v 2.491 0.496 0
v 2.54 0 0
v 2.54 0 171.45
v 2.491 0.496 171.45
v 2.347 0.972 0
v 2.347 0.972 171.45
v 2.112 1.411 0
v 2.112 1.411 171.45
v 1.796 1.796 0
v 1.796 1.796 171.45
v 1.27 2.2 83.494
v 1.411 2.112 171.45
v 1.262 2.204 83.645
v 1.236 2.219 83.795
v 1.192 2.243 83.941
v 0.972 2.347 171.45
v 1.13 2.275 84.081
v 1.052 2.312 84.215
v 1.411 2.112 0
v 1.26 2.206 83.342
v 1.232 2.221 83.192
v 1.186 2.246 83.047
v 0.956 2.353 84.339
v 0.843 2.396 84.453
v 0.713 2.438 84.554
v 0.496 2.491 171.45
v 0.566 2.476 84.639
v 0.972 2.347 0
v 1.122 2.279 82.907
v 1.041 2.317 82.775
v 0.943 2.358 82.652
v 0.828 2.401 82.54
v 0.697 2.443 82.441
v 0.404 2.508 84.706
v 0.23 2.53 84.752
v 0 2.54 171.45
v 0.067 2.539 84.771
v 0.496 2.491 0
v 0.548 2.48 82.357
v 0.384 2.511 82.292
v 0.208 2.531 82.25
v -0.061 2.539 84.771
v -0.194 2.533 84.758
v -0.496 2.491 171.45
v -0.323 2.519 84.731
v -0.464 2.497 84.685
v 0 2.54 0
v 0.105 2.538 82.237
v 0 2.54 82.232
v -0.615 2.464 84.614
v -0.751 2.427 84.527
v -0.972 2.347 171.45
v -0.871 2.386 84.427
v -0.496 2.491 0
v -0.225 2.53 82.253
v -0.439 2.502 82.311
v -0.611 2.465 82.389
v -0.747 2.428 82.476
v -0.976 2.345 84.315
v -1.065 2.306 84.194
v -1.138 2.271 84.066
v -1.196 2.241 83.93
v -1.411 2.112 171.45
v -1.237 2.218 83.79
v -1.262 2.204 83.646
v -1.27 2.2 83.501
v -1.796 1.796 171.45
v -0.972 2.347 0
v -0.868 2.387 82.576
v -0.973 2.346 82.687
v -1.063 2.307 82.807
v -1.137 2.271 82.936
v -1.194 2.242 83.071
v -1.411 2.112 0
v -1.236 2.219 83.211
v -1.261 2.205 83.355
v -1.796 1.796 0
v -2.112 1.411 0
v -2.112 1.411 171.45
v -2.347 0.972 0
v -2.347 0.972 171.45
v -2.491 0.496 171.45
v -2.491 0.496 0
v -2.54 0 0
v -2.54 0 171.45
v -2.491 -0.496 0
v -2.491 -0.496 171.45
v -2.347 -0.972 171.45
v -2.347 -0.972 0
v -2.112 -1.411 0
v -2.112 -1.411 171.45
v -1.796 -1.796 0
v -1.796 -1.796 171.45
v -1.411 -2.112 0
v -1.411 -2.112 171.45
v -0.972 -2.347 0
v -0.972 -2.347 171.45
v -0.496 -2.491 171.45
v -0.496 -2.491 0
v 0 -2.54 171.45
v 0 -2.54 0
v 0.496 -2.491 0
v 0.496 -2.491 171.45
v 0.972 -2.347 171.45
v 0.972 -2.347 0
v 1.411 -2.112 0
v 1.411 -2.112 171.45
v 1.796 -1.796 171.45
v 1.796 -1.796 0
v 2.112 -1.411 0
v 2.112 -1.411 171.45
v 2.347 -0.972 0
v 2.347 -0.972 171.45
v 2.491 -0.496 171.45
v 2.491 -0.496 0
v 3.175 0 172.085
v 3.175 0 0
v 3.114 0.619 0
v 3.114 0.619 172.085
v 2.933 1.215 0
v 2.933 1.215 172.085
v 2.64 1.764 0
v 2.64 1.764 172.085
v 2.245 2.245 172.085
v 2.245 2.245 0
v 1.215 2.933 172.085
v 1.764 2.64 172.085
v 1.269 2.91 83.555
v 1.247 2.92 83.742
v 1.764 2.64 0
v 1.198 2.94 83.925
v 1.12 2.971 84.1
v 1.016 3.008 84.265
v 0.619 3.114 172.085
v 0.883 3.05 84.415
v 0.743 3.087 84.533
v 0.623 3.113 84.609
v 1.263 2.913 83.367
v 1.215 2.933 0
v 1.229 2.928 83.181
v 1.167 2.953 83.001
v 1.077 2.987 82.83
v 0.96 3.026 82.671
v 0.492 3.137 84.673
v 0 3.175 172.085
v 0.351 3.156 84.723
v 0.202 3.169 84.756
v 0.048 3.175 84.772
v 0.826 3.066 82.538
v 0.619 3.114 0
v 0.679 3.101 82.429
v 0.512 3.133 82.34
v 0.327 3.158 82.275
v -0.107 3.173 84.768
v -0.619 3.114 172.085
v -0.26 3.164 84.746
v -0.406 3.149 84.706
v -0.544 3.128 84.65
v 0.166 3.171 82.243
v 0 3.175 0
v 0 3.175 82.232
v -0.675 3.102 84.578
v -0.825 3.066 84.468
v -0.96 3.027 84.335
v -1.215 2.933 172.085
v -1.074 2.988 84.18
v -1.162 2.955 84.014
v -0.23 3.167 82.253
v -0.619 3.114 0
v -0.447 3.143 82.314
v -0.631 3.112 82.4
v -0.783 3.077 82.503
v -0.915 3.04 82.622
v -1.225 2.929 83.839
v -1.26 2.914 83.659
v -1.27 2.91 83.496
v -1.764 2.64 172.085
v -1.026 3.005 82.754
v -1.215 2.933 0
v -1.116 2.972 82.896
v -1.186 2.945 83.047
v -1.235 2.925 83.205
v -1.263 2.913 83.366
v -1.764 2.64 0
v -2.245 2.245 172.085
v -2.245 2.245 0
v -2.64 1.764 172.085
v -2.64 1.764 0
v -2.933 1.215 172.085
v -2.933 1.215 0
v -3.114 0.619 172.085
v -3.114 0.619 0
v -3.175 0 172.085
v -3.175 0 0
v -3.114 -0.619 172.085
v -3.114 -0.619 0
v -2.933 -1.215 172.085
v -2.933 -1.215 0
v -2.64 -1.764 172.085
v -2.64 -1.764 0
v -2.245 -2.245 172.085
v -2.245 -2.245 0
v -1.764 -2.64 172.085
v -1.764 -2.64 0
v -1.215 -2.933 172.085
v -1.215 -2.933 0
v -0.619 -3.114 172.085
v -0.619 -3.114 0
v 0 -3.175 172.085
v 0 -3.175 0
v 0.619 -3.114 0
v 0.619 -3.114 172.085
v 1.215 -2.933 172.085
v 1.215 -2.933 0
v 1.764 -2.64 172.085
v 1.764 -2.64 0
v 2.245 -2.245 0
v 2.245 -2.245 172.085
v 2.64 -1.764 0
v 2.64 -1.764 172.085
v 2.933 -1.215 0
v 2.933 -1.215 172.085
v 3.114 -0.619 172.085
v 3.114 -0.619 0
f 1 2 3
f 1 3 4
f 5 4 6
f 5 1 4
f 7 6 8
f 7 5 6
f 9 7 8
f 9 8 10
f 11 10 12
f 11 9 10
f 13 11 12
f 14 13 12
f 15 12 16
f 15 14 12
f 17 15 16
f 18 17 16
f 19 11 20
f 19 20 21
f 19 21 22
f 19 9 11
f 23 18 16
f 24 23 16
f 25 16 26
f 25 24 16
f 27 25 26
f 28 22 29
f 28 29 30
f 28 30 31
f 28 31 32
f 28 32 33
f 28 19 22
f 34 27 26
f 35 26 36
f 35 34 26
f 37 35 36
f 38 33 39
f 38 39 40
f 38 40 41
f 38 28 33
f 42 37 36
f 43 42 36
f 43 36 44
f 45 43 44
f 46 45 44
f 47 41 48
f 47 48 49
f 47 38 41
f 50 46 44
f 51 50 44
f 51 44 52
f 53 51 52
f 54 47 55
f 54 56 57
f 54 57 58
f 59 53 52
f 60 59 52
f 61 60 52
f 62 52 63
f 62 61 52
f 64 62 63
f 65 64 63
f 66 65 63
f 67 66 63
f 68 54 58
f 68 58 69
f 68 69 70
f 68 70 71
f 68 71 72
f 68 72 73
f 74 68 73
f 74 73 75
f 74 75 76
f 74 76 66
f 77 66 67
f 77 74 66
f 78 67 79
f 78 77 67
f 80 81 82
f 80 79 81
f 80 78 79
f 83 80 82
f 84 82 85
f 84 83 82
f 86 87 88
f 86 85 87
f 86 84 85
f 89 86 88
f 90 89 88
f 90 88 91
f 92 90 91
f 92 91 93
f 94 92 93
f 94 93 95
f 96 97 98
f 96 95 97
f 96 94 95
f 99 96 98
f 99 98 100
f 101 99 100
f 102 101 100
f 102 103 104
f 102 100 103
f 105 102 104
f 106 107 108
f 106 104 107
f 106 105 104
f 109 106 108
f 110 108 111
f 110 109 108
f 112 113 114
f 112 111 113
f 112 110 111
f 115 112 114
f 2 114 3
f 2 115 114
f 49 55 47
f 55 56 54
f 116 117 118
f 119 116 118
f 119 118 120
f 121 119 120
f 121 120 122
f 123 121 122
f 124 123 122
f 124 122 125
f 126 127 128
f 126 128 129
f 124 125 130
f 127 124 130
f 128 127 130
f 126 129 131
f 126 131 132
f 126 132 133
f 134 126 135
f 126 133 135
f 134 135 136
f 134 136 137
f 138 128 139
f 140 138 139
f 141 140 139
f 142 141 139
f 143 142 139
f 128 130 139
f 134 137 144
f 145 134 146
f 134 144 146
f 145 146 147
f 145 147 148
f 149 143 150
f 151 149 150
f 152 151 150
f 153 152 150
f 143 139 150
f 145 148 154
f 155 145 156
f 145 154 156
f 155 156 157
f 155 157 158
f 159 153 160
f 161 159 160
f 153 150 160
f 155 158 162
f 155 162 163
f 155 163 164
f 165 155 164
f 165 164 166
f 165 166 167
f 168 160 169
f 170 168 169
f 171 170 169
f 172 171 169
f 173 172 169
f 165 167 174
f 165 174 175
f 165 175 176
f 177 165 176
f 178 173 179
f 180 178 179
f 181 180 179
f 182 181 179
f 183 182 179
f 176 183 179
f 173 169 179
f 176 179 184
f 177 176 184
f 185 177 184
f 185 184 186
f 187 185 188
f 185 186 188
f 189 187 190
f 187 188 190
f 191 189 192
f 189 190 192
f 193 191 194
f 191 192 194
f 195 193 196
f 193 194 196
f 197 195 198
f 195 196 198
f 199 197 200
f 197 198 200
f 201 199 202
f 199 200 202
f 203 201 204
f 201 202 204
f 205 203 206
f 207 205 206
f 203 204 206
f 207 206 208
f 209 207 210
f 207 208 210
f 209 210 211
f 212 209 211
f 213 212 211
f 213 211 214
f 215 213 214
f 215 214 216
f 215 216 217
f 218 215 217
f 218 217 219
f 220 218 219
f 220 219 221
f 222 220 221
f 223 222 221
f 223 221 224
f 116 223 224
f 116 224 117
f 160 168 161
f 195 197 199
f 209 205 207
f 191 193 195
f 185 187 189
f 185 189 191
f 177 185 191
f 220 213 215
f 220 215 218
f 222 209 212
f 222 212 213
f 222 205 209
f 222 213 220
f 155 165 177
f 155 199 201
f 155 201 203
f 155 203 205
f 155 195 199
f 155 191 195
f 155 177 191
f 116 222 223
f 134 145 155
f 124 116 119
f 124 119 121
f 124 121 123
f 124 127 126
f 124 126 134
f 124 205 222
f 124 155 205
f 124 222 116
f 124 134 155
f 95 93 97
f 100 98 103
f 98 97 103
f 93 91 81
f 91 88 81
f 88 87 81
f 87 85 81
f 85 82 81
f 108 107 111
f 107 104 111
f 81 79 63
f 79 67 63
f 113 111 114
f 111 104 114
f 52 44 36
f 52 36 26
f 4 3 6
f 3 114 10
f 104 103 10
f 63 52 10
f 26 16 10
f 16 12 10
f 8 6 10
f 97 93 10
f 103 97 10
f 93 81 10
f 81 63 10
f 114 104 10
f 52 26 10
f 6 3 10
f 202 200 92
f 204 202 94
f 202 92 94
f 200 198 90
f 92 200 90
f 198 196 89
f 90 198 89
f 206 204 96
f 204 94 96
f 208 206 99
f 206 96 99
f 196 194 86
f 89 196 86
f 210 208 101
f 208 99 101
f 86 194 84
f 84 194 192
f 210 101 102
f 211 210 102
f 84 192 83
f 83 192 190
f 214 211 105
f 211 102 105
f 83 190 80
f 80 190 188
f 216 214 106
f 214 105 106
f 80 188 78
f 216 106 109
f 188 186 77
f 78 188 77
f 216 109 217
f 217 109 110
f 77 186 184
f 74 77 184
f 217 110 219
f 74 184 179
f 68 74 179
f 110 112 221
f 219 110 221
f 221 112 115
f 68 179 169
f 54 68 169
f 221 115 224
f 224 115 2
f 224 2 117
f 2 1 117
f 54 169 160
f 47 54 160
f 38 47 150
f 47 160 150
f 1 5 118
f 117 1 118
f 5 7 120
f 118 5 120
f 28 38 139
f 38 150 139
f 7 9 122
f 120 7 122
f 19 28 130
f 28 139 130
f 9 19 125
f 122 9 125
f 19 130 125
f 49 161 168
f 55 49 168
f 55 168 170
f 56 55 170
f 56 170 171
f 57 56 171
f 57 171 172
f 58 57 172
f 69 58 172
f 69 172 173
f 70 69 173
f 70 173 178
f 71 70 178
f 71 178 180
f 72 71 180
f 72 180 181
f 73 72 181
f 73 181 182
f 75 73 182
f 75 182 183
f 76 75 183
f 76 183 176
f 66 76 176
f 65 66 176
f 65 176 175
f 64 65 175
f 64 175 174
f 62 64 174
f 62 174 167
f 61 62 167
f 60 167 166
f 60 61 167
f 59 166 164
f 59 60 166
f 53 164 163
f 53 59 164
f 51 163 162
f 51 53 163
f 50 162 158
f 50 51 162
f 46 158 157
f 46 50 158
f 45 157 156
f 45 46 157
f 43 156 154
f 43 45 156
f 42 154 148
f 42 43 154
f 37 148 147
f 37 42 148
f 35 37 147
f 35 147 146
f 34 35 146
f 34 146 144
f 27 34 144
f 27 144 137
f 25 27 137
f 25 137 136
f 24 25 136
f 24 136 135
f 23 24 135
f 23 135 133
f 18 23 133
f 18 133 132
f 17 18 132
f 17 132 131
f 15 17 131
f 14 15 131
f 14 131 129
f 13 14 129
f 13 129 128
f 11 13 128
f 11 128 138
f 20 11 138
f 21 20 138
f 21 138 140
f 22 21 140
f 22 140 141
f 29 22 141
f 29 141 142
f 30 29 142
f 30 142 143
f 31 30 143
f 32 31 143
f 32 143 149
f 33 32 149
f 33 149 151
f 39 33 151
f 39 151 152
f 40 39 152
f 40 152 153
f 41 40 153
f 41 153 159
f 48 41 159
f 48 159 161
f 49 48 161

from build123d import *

# Parameters (mm, degrees)
SKETCH1_R           = 3.175
BOSS_EXTRUDE1_DEPTH = 172.085
SHELL1_T            = -0.635
SKETCH3_R           = 1.27
CUT_EXTRUDE3_DEPTH  = 5.08


with BuildPart() as part:
    # Sketch1 → Boss-Extrude1 (new body)
    with BuildSketch(Plane.XY):
        Circle(SKETCH1_R)
    extrude(amount=BOSS_EXTRUDE1_DEPTH)

    # Shell1
    shell1_openings = [part.faces().sort_by_distance(p)[0] for p in [
        (0, 0, 0),
    ]]
    offset(amount=SHELL1_T, openings=shell1_openings, kind=Kind.INTERSECTION)

    # Sketch3 → Cut-Extrude3 (cut)
    with BuildSketch(Plane(origin=(0, 0, 0), x_dir=(1, 0, 0), z_dir=(0, 1, 0))):
        with Locations(Location((0, -83.5025, 0), (0, 0, 90))):
            Circle(SKETCH3_R)
    extrude(amount=CUT_EXTRUDE3_DEPTH, mode=Mode.SUBTRACT)


solid = part.part
